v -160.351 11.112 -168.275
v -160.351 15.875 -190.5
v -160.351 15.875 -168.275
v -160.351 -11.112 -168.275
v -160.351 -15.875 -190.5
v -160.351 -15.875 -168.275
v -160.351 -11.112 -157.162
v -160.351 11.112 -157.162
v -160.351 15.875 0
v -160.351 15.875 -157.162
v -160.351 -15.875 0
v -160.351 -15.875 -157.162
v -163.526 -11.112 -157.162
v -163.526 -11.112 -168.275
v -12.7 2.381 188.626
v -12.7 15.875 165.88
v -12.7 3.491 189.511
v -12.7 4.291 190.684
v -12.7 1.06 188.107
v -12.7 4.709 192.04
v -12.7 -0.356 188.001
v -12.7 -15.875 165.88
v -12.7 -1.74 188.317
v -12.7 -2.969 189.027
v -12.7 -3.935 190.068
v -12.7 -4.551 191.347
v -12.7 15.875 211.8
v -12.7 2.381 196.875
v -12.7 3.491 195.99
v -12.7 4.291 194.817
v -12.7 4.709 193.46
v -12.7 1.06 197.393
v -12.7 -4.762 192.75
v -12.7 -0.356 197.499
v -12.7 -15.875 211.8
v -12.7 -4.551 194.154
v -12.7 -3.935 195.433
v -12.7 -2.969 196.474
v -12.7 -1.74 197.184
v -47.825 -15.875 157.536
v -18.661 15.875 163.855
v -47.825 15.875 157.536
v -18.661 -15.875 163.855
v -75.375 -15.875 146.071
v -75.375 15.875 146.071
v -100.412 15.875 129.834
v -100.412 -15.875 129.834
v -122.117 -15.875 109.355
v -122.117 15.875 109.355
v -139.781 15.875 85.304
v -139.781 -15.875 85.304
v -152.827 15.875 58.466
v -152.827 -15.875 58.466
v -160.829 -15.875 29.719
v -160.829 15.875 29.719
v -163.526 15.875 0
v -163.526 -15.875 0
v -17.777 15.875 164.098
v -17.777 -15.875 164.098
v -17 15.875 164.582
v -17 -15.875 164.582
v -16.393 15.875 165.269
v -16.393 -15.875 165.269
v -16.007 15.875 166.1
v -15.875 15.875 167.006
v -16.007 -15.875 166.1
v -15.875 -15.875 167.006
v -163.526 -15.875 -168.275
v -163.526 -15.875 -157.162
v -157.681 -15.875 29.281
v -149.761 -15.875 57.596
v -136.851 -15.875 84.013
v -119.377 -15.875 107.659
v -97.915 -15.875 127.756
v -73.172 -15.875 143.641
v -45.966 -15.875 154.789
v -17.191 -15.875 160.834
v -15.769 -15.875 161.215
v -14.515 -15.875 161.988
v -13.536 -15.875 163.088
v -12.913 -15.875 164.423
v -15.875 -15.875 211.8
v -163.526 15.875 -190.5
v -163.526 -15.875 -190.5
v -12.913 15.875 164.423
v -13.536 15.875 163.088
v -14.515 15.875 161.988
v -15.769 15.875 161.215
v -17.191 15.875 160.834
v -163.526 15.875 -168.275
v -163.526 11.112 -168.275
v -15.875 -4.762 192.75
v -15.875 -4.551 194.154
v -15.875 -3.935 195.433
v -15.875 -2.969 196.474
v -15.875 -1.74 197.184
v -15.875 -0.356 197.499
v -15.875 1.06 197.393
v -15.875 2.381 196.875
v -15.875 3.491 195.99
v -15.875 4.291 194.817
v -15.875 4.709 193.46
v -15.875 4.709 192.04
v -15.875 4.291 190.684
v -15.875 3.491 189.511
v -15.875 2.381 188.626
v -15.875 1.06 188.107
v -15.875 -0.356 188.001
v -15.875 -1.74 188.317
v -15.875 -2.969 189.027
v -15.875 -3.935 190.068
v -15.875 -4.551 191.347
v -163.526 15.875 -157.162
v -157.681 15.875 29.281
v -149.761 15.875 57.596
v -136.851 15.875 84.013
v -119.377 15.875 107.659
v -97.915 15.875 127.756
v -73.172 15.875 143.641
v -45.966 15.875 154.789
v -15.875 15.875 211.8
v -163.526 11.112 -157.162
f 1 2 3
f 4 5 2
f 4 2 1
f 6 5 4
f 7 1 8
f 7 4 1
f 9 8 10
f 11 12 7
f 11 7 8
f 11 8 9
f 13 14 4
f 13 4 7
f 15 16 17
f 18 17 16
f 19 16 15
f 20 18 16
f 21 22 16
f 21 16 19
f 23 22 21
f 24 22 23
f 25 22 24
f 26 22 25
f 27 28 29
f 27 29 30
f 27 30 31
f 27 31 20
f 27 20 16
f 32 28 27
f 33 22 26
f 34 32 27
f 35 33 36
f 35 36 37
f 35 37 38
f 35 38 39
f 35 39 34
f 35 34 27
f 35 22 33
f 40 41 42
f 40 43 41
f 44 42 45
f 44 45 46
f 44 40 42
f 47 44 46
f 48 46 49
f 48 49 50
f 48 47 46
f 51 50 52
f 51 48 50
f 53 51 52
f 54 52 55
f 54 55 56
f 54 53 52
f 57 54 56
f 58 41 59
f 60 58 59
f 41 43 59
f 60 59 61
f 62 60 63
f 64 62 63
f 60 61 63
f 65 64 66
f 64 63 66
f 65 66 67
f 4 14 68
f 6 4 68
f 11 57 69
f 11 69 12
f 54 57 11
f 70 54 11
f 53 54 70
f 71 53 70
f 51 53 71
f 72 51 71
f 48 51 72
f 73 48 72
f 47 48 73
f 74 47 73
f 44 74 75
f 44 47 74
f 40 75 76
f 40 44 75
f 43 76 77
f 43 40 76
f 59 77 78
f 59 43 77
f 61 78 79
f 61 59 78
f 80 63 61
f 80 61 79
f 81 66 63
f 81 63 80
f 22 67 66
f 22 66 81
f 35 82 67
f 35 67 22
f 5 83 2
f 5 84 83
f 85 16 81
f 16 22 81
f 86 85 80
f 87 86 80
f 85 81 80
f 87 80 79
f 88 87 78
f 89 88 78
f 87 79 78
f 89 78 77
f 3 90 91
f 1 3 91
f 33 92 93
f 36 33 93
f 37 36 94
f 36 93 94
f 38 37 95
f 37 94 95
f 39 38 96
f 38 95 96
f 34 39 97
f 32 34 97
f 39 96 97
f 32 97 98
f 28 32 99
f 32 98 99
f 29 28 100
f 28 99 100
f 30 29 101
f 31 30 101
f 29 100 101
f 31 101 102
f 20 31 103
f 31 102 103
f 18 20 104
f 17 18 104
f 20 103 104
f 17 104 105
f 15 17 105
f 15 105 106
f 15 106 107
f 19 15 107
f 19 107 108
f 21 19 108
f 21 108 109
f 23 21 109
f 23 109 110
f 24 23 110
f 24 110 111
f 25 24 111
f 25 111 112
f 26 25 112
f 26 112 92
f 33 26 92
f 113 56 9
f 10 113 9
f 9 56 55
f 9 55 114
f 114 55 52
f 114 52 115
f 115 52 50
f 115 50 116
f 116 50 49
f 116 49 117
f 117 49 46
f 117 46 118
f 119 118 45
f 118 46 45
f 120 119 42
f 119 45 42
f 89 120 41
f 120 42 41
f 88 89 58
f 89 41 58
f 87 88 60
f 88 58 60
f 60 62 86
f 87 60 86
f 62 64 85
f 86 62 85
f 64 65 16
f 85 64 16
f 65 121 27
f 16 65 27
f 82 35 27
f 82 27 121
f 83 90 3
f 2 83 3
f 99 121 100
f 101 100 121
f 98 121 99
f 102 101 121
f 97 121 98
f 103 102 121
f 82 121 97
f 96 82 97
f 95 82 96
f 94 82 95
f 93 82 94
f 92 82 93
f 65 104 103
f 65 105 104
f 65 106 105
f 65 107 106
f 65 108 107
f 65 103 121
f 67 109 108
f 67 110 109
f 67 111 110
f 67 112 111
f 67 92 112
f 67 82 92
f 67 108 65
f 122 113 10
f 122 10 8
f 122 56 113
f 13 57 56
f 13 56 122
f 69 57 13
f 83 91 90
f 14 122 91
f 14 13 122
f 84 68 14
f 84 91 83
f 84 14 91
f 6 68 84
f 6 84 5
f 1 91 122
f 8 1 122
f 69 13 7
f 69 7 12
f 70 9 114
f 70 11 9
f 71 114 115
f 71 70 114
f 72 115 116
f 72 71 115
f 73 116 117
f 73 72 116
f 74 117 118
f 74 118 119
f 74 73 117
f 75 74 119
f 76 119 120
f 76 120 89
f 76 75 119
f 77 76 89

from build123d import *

# Parameters (mm, degrees)
F0_W     = 3.175
F0_H     = 28.575
F1_DEPTH = 15.875
F2_R     = 3.175
F3_R     = 5.08
F4_R     = 4.7625
F5_DEPTH = 3.176
F6_W     = 4.7625
F6_H     = 11.1125
F7_DEPTH = 25.4


with BuildPart() as f1:
    # F0 (on Front) → F1 (new body, symmetric)
    with BuildSketch(Plane.XZ):
        with BuildLine():
            ThreePointArc((-160.35073, 0), (-117.864138, 109.335137), (-12.7, 161.294609))
            Line((-12.7, 161.294609), (-12.7, 211.800312))
            Line((-12.7, 211.800312), (-15.875, 211.800312))
            Line((-15.875, 211.800312), (-15.875, 164.175312))
            ThreePointArc((-15.875, 164.175312), (-121.183386, 110.401847), (-163.52573, 0))
            Line((-163.52573, 0), (-163.52573, -161.925))
            Line((-163.52573, -161.925), (-160.35073, -161.925))
            Line((-160.35073, -161.925), (-160.35073, 0))
        make_face()
        with Locations((-161.93823, -176.2125)):
            Rectangle(F0_W, F0_H)
    extrude(amount=F1_DEPTH, both=True)

    # F2
    f2_edges = [f1.edges().sort_by_distance(p)[0] for p in [
        (-15.875, 0, 164.175312),
    ]]
    fillet(f2_edges, radius=F2_R)

    # F3
    f3_edges = [f1.edges().sort_by_distance(p)[0] for p in [
        (-12.7, 0, 161.294609),
    ]]
    fillet(f3_edges, radius=F3_R)

    # F4 (on face) → F5 (cut, through all)
    with BuildSketch(Plane(origin=(-15.875, 0, 0), x_dir=(0, -1, 0), z_dir=(-1, 0, 0))):
        with Locations((0, 192.750312)):
            Circle(F4_R)
    extrude(amount=-F5_DEPTH, mode=Mode.SUBTRACT)

    # F6 (on face) → F7 (cut)
    with BuildSketch(Plane(origin=(-163.52573, 0, 0), x_dir=(0, -1, 0), z_dir=(-1, 0, 0))):
        with Locations((-13.49375, -162.71875)):
            Rectangle(F6_W, F6_H)
        with Locations((13.49375, -162.71875)):
            Rectangle(F6_W, F6_H)
    extrude(amount=-F7_DEPTH, mode=Mode.SUBTRACT)


solid = f1.part
